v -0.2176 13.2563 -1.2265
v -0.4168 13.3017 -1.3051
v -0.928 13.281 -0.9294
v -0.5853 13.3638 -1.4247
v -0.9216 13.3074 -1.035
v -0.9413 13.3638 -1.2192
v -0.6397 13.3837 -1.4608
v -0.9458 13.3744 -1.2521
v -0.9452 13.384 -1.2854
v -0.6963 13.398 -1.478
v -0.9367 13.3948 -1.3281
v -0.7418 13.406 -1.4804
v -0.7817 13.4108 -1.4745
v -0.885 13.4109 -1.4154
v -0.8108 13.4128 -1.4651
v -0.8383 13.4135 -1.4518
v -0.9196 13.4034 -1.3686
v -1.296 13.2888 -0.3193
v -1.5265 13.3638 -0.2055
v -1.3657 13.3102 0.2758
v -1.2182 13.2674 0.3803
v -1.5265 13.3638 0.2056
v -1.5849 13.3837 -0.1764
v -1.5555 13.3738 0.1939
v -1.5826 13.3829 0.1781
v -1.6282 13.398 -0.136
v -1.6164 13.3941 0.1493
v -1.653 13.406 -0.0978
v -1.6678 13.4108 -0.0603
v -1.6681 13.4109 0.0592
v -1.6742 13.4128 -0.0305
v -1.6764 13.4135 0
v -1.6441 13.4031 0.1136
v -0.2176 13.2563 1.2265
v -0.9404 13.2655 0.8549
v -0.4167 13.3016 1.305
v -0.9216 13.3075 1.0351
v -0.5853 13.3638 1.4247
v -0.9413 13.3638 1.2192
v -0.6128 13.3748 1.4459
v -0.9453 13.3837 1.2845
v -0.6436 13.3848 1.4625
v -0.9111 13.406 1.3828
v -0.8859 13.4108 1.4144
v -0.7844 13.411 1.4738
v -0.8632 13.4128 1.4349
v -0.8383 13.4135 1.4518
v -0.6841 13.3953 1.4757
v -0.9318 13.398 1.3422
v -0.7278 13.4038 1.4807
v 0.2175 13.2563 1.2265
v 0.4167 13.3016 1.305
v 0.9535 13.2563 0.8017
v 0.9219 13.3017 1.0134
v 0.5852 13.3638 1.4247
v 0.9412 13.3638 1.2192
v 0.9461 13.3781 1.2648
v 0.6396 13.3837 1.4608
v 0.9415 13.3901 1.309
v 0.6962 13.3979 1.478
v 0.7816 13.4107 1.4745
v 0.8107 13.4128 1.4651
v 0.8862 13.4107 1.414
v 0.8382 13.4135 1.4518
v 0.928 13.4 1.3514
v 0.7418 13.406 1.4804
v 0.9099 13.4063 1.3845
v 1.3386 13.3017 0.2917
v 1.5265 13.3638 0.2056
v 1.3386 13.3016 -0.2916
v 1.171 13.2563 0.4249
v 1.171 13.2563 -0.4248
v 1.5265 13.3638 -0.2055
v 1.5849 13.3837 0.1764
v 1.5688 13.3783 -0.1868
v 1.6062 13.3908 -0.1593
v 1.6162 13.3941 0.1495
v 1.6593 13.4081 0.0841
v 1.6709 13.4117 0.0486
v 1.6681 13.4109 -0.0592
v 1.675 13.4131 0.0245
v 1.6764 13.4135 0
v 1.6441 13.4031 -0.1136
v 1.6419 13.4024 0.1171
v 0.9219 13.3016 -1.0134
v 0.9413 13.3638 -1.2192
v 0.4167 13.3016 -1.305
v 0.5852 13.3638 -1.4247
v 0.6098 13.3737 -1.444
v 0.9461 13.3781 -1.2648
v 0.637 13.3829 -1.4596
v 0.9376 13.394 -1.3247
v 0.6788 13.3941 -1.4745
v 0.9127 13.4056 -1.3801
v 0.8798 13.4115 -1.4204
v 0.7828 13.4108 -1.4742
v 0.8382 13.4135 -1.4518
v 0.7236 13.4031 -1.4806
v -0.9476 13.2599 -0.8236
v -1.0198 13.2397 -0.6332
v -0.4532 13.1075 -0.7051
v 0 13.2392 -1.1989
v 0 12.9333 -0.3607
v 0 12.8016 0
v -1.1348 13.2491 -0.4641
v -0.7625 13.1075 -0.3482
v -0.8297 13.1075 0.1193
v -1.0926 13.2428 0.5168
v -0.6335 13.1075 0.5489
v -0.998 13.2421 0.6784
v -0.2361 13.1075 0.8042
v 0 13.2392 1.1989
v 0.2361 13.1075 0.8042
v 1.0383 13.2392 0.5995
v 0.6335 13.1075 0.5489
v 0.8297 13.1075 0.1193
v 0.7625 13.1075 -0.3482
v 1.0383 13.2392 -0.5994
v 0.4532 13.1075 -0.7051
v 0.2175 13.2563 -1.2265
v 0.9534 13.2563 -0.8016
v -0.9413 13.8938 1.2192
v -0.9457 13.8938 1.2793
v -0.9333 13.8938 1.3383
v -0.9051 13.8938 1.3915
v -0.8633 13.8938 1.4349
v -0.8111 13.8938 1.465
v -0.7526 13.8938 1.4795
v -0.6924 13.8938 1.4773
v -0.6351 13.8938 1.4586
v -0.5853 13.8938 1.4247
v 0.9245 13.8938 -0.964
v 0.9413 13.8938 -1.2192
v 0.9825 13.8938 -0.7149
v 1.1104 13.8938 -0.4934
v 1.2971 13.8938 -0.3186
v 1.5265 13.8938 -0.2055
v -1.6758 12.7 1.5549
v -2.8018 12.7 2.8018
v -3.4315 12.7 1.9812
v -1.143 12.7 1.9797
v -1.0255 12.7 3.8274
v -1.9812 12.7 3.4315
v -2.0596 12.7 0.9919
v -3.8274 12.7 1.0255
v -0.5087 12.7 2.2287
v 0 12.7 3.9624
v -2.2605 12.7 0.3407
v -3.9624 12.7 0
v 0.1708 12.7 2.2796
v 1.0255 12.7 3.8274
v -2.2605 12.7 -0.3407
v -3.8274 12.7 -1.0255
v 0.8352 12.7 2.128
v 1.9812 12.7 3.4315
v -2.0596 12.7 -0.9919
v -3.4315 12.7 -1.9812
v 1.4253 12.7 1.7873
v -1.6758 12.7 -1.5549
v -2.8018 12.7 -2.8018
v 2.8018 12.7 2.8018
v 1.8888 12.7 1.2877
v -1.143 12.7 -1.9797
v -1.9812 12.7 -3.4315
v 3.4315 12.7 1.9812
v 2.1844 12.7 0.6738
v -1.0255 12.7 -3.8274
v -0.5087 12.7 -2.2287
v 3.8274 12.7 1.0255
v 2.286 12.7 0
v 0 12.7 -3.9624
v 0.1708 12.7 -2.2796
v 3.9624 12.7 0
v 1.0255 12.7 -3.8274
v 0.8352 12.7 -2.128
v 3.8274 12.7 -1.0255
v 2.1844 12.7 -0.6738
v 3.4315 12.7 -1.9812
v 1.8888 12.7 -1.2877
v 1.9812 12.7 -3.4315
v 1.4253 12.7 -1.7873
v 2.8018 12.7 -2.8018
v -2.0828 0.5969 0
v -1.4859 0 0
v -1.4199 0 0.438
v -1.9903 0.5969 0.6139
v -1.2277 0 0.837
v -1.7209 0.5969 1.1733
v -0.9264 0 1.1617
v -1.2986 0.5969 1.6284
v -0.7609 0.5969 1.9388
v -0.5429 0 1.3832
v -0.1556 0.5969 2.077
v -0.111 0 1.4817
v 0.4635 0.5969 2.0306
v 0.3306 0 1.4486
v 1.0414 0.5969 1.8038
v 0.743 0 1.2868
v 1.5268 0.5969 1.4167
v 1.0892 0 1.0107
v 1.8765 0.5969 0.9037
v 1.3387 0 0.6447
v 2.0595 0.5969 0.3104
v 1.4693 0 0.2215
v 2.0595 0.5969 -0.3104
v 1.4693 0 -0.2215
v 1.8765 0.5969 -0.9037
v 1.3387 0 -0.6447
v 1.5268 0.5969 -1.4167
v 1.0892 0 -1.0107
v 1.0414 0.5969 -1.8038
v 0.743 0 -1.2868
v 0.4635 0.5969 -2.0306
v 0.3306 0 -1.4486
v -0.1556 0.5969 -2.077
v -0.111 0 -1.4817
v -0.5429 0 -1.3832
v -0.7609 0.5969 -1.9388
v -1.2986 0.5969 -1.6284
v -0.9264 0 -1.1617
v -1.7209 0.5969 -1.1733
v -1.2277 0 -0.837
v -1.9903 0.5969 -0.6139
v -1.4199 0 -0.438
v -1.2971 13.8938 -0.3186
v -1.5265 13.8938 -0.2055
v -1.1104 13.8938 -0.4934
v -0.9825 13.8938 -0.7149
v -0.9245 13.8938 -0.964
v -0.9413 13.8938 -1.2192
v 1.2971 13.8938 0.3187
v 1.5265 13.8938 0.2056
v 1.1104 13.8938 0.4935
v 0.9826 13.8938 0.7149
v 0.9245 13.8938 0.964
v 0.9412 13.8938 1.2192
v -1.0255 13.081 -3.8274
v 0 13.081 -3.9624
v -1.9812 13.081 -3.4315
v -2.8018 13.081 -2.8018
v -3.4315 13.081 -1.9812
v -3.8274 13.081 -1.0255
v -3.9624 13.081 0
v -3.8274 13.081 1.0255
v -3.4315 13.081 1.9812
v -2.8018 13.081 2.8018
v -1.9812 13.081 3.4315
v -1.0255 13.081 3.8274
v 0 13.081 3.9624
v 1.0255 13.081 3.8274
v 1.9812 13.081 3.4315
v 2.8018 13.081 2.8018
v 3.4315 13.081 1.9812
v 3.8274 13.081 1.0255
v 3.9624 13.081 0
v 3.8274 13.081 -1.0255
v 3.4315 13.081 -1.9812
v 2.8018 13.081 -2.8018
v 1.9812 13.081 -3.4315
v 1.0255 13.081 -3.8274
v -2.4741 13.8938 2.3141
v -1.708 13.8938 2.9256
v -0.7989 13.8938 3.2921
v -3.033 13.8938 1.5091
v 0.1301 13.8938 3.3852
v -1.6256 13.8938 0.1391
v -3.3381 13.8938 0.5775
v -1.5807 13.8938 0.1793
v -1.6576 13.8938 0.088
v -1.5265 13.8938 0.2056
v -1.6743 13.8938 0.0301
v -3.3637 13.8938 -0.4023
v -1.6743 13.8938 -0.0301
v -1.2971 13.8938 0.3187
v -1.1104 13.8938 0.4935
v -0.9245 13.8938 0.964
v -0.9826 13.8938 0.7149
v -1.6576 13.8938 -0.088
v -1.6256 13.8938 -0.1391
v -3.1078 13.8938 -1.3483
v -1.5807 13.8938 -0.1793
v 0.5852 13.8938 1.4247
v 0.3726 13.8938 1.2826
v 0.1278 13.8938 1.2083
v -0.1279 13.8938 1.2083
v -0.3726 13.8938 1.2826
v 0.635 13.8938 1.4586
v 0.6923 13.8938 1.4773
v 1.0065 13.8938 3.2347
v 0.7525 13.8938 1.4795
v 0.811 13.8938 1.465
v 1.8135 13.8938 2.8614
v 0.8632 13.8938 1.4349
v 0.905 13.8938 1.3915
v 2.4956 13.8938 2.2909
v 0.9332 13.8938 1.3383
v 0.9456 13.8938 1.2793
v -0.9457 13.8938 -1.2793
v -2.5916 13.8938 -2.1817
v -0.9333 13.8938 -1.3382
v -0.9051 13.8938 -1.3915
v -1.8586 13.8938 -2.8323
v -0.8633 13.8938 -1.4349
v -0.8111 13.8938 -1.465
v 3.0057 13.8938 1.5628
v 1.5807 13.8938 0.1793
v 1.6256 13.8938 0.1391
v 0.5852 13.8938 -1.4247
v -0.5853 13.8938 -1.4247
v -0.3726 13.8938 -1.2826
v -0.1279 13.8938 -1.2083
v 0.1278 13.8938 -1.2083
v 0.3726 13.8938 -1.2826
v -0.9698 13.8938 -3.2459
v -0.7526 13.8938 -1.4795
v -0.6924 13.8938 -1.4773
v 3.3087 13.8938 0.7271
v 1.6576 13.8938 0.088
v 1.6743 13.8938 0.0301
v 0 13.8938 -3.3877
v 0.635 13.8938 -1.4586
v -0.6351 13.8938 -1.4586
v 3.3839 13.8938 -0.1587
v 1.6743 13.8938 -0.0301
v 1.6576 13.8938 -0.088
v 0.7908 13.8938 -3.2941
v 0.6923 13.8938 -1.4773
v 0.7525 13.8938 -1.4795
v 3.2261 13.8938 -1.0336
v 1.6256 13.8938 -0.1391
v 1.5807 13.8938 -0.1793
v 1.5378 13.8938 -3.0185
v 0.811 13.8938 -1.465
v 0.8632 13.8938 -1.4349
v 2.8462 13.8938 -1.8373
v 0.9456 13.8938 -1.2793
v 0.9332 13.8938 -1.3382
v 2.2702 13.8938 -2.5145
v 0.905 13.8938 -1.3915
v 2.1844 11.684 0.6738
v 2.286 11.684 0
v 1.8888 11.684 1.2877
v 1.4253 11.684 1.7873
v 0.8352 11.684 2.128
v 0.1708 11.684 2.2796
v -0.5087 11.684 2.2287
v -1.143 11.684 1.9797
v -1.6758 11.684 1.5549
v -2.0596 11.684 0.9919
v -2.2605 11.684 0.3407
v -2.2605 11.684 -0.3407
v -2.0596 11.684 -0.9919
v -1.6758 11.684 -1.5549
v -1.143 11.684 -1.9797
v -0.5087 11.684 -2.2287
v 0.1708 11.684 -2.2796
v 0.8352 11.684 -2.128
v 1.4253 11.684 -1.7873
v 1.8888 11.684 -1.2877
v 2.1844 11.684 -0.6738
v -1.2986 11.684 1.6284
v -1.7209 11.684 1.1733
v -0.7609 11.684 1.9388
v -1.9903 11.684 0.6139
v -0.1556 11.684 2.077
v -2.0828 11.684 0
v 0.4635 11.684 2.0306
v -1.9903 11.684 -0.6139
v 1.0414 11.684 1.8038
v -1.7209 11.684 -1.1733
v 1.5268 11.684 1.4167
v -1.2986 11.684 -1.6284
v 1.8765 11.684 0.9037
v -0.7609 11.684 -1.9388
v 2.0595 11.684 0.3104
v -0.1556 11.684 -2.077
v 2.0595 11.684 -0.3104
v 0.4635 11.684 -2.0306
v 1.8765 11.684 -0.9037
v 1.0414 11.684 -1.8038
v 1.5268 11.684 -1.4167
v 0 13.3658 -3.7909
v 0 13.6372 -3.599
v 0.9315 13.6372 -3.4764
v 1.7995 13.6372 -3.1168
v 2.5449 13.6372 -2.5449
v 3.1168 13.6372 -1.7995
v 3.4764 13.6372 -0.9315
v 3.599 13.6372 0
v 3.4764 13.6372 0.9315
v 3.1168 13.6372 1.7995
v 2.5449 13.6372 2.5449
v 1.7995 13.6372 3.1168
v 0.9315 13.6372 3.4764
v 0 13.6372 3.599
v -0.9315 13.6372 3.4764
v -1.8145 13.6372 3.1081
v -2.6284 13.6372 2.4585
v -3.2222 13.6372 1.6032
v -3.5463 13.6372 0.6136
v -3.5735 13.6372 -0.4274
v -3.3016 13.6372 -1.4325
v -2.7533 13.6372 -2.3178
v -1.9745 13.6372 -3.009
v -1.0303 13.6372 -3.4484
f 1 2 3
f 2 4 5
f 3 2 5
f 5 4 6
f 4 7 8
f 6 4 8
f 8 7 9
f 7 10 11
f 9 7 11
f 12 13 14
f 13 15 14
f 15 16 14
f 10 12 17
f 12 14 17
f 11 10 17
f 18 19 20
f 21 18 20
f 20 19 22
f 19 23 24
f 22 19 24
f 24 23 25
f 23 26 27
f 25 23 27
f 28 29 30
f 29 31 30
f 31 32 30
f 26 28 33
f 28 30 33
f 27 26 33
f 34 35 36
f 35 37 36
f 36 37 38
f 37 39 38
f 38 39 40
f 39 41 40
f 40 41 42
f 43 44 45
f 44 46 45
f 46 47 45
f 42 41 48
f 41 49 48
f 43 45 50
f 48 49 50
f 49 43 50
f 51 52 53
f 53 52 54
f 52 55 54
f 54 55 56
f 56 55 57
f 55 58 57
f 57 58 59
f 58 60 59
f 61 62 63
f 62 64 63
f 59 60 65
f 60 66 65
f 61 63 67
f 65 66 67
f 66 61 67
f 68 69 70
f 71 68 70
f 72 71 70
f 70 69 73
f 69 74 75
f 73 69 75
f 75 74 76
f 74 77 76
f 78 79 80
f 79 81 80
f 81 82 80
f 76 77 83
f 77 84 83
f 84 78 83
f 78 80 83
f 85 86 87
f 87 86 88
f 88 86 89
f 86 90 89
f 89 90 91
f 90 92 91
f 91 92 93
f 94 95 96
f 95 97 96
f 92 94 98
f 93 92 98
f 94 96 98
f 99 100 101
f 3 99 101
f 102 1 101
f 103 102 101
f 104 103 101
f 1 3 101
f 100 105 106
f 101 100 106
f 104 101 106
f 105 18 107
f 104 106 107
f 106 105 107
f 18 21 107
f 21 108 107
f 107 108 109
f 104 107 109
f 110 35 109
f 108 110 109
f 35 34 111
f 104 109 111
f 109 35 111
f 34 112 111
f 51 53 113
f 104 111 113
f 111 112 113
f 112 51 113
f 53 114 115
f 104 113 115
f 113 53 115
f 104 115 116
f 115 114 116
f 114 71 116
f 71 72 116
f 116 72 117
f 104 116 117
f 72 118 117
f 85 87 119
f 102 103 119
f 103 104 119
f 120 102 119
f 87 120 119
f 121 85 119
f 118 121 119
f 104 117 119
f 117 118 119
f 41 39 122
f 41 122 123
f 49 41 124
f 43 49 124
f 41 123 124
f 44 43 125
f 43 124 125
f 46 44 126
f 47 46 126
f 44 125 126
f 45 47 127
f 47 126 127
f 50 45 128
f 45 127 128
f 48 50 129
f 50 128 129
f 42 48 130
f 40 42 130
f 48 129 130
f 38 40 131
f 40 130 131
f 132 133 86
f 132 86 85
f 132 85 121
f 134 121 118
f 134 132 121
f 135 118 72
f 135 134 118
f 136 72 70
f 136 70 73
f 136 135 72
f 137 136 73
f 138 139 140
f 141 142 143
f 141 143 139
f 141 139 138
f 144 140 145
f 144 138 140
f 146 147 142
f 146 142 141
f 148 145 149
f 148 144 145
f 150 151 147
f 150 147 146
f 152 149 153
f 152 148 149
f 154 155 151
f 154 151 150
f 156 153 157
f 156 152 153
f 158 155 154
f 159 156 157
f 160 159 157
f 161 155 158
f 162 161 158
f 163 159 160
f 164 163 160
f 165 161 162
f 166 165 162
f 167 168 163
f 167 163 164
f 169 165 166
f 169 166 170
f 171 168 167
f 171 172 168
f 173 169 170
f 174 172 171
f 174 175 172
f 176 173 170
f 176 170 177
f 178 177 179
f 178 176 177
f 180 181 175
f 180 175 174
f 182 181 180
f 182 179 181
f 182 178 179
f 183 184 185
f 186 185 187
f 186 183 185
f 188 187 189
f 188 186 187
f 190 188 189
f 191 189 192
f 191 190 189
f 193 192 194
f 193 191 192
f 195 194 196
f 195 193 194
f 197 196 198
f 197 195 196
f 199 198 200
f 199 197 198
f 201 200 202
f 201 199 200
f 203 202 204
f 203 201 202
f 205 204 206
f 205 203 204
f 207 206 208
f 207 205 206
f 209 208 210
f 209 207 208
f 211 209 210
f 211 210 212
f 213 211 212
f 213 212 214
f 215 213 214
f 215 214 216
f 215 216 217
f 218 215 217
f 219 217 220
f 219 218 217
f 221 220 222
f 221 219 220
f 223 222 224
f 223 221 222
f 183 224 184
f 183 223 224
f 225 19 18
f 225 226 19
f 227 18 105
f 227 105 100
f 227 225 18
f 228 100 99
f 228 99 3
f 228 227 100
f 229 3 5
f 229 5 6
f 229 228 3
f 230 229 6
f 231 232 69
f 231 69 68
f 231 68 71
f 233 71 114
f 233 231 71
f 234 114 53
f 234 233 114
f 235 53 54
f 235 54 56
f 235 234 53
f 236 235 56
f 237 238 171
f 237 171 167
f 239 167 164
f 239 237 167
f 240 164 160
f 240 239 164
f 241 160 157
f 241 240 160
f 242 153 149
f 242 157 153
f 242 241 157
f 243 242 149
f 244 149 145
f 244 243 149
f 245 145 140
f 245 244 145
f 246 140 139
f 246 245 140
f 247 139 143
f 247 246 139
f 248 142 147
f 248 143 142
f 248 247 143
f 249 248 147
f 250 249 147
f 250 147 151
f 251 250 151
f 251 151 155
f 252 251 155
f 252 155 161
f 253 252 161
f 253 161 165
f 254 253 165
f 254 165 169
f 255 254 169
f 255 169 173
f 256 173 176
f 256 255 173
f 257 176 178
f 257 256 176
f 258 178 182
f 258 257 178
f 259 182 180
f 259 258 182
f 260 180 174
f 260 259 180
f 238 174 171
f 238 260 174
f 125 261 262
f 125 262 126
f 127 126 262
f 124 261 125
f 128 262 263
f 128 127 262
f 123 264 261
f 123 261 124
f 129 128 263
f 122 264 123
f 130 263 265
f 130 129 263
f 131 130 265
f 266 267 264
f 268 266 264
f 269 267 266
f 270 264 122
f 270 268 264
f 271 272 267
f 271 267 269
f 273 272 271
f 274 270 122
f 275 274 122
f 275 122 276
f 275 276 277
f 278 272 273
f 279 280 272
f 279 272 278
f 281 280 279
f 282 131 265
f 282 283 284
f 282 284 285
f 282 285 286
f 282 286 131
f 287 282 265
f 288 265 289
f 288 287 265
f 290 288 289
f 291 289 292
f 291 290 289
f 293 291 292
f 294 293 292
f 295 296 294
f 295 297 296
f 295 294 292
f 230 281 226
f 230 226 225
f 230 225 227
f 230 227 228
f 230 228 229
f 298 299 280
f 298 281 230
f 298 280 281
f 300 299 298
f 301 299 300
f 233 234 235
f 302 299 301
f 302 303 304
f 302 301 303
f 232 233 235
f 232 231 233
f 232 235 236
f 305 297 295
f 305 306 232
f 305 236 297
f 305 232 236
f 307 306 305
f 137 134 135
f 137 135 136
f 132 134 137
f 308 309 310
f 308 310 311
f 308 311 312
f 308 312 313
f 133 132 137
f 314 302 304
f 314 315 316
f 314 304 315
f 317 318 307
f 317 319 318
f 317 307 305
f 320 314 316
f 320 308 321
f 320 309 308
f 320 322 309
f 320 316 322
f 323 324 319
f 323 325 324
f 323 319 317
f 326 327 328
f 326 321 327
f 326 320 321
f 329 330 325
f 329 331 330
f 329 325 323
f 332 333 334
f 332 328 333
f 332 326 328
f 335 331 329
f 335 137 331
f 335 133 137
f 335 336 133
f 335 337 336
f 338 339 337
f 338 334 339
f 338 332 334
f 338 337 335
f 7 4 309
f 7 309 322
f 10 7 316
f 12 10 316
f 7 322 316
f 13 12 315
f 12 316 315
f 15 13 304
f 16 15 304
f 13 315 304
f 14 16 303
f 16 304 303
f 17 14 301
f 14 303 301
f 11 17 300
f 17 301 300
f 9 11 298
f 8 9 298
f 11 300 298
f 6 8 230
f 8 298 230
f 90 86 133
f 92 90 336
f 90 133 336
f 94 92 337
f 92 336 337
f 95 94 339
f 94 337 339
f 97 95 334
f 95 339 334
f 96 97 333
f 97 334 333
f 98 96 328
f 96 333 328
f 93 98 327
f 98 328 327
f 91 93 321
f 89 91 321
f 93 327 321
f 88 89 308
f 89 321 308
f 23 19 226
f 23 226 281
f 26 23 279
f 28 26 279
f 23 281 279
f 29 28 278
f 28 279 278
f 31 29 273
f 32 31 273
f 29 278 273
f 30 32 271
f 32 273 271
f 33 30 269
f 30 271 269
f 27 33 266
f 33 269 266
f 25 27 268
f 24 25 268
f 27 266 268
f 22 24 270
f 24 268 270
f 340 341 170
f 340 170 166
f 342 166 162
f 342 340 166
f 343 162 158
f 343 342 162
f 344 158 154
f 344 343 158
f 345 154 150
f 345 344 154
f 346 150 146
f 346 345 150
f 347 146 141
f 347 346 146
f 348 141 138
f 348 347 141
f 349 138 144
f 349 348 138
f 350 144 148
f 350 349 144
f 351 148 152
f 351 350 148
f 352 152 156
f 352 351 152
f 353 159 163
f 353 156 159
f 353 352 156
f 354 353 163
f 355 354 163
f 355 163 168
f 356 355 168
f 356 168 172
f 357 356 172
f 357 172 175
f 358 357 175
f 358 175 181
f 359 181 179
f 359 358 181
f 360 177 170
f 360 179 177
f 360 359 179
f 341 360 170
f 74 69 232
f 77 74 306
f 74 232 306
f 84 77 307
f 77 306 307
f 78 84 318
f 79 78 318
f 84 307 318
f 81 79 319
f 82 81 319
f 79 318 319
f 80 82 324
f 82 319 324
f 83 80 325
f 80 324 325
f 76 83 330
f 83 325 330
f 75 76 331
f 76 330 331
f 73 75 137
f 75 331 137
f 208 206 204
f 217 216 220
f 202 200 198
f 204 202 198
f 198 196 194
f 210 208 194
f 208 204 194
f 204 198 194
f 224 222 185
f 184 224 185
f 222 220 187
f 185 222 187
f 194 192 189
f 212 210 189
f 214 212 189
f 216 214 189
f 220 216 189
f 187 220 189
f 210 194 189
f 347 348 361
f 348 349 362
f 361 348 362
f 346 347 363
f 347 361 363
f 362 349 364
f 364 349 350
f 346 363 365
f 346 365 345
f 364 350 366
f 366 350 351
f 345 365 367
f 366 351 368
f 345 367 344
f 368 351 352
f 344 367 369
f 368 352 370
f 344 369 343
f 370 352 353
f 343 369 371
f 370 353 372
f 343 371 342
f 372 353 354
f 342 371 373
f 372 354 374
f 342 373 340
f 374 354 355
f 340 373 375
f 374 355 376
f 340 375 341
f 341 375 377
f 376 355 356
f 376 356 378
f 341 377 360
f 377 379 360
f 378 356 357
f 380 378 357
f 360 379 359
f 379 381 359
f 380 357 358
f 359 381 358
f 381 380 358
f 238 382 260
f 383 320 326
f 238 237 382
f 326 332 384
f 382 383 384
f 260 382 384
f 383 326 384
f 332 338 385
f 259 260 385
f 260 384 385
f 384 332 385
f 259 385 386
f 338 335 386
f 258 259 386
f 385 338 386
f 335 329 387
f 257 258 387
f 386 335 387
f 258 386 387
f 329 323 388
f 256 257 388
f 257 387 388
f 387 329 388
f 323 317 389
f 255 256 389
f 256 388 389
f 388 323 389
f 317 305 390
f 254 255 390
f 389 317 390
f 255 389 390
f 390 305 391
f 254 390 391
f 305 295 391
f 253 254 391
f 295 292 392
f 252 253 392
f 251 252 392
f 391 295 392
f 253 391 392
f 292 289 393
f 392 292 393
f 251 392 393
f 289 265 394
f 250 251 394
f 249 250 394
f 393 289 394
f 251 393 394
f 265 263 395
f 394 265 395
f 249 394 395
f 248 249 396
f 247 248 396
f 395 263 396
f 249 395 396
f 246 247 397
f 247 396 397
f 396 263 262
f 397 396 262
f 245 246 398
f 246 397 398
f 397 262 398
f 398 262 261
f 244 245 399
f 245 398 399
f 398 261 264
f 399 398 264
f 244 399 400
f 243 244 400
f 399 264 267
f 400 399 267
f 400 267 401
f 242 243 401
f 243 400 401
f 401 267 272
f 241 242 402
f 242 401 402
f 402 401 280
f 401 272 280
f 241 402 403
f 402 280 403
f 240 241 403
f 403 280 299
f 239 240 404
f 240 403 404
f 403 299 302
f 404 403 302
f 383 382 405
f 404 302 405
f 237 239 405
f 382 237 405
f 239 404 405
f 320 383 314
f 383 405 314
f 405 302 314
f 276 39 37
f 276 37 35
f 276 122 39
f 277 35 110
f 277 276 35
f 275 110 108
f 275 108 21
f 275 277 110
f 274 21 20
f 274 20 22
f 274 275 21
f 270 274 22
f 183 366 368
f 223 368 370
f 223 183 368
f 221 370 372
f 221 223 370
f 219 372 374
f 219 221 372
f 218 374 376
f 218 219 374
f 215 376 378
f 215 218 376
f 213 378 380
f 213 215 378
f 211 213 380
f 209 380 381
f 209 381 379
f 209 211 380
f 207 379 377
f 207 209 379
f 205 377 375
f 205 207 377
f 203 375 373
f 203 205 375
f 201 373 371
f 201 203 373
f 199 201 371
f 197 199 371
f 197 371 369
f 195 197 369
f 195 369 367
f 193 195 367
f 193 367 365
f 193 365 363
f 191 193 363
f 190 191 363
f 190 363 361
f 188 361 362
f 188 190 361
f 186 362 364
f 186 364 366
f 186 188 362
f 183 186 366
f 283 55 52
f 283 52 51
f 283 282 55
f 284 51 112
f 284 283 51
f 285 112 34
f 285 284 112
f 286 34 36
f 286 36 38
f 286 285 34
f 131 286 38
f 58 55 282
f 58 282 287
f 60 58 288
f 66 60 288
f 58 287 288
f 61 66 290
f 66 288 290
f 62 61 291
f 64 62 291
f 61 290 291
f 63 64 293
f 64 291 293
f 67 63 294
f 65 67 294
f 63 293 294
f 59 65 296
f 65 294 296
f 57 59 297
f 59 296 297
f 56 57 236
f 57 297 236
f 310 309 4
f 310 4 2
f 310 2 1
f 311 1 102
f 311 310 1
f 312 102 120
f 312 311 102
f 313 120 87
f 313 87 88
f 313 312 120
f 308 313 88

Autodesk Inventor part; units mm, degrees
ref_plane "YZ Plane" through (0, 0, 0) normal (1, 0, 0) x (0, 1, 0)
ref_plane "XZ Plane" through (0, 0, 0) normal (0, 1, 0) x (-1, 0, 0)
ref_plane "XY Plane" through (0, 0, 0) normal (0, 0, 1) x (1, 0, 0)
sketch "Sketch1" plane through (0, 0, 0) normal (0, 1, 0) x (-1, 0, 0)
  circle A0 centre (0, 0) radius 2.0828
  dimension "d4" = 4.1656
extrude "Body" add sketch "Sketch1" along normal blind 12.7
sketch "Sketch2" plane through (0, 0, 0) normal (1, 0, 0) x (0, 1, 0)
  line L0 (12.7, -2.0828) -> (12.7, 2.0828) projected
  line L1 (12.7, 0) -> (12.7, -3.9624)
  line L2 (12.7, -3.9624) -> (13.081, -3.9624)
  arc A0 (13.081, -3.9624) -> (14.9098, -2.0828) centre (10.8888, 0) ccw
  line L3 (14.9098, -2.0828) -> (14.9098, -1.6764)
  line L4 (14.9098, -1.6764) -> (13.4135, -1.6764)
  line L5 (13.4135, -1.6764) -> (12.8016, 0)
  line L6 (12.8016, 0) -> (12.7, 0)
  point P0 (0, 0)
  dimension "d5" = 3.9624
  dimension "d6" = 0.381
  dimension "d13" = 0.1016
  dimension "d14" = 2.0828
  dimension "d15" = 2.2098
  dimension "d16" = 0
  dimension "d17" = 1.6764
  dimension "d57" = 20.053
revolve "Head" add sketch "Sketch2" angle 360 about axis through (0, 12.8016, 0) along (0, -1, 0)
sketch "Sketch3" plane through (0, 14.9098, 0) normal (0, 1, 0) x (1, 0, 0)
  circle A0 centre (0, 0) radius 1.6764 projected
  line L0 (0.7302, -1.2648) -> (-0.7303, -1.2648) construction
  line L1 (-0.7303, -1.2648) -> (-1.4605, 0) construction
  line L2 (-1.4605, 0) -> (-0.7303, 1.2648) construction
  line L3 (-0.7303, 1.2648) -> (0.7302, 1.2648) construction
  line L4 (0.7302, 1.2648) -> (1.4605, 0) construction
  line L5 (1.4605, 0) -> (0.7302, -1.2648) construction
  circle A1 centre (-0.7303, -1.2648) radius 0.2159
  circle A2 centre (-1.4605, 0) radius 0.2159
  circle A3 centre (-0.7303, 1.2648) radius 0.2159
  circle A4 centre (0.7302, 1.2648) radius 0.2159
  circle A5 centre (1.4605, 0) radius 0.2159
  circle A6 centre (0.7302, -1.2648) radius 0.2159
  circle A7 centre (0, -2.0701) radius 0.8712
  circle A8 centre (0, 2.0701) radius 0.8712
  circle A9 centre (1.7928, -1.0351) radius 0.8712
  circle A10 centre (-1.7928, 1.035) radius 0.8712
  circle A11 centre (1.7928, 1.035) radius 0.8712
  circle A12 centre (-1.7928, -1.0351) radius 0.8712
  circle A13 centre (0, 0) radius 1.8188
  point P0 (0, 0)
  point P1 (0, 0)
  point P2 (0.9413, 1.2192)
  point P3 (1.5265, 0.2056)
  point P4 (1.5265, -0.2056)
  point P5 (0.9413, -1.2192)
  point P6 (0.5852, -1.4248)
  point P7 (-0.5852, -1.4248)
  point P8 (-0.9413, -1.2192)
  point P9 (-1.5265, -0.2056)
  point P10 (-1.5265, 0.2056)
  point P11 (-0.9413, 1.2192)
  point P12 (-0.5852, 1.4248)
  point P13 (0.5852, 1.4248)
  dimension "d58" = 2.921
  dimension "d59" = 4.1402
  dimension "d62" = 120
extrude "Hex" add sketch "Sketch3" against normal blind 1.778 contours A5 A11 A0 | A0 A11 A13 A9 | A0 A9 A5 | A11 A0 | A0 A11 A13 | A9 A13 A0 | A0 A9 | A11 A4 A0 | A0 A8 A13 A11 | A9 A13 A7 A0 | A0 A6 A9 | A4 A8 A0 | A0 A7 A6 | A8 A0 | A7 A0 | A0 A8 A13 | A7 A13 A0 | A3 A0 A8 | A7 A0 A1 | A0 A10 A13 A8 | A7 A13 A12 A0 | A3 A10 A0 | A0 A12 A1 | A10 A0 A13 | A13 A12 A0 | A10 A0 | A0 A12 | A10 A0 A12 A13 | A10 A2 A0 | A0 A2 A12
sketch "Sketch4" plane through (0, 0, 0) normal (0, 0, 1) x (1, 0, 0)
  line L0 (-0.7364, 13.9698) -> (-1.6764, 14.9098)
  line L1 (0, 14.9098) -> (-0.7364, 13.9698)
  line L2 (0, -1.9152) -> (0, 11.491) projected
  line L3 (-1.5265, 14.9098) -> (-1.5265, 13.3638) projected
  line L4 (-1.5265, 14.9098) -> (-1.5265, 14.9098) projected
  line L5 (-1.5265, 14.9098) -> (-1.5265, 13.3638) projected
  line L6 (-1.6764, 14.9098) -> (-1.5265, 14.9098) projected
  line L7 (-1.6764, 14.9098) -> (0, 14.9098)
  point P0 (0, 0)
  point P1 (-1.6764, 13.4135)
  dimension "d29" = 1.6764
revolve "Head Chamfer" cut sketch "Sketch4" angle 360 about axis through (0, -10, 0) along (0, 1, 0)
feature "Thread" [suppressed]
sketch "Sketch6" plane through (0, 0, 0) normal (0, 0, 1) x (1, 0, 0)
  line L0 (0, 0) -> (-1.4859, 0)
  line L1 (2.0828, 0) -> (-2.0828, 0) projected
  line L2 (-1.4859, 0) -> (-2.4948, 1.0089)
  line L3 (-2.4948, 1.0089) -> (-2.9651, -1.2188)
  line L4 (-2.9651, -1.2188) -> (-1.4859, -1.2188)
  line L5 (-2.0828, 0) -> (-2.0828, 12.7) projected
  line L6 (-1.4859, -1.2188) -> (-1.4859, 0)
  line L7 (0, -2.9358) -> (0, 9.083) projected
  point P0 (-2.0828, 0.5969)
  dimension "d49" = 1.4859
  dimension "d50" = 135
revolve "Tapered End" cut sketch "Sketch6" angle 360 about axis through (0, -10, 0) along (0, 1, 0)
sketch "Sketch8" plane through (0, 0, 0) normal (0, 0, 1) x (1, 0, 0)
  line L0 (-3.9624, 12.7) -> (3.9624, 12.7) projected
  line L1 (0, 12.7) -> (2.286, 12.7)
  line L2 (2.286, 12.7) -> (2.286, 11.684)
  line L3 (2.286, 11.684) -> (0, 11.684)
  line L4 (0, 11.684) -> (0, 12.7)
  point P0 (0, 0)
  dimension "d69" = 2.286
  dimension "d70" = 1.016
revolve "Shoulder" add sketch "Sketch8" angle 360 about axis through (0, 11.684, 0) along (0, 1, 0)
sketch "Sketch9" plane through (0, 14.9098, 0) normal (0, 1, 0) x (1, 0, 0)
  circle A0 centre (0, 0) radius 5.7238
  point P0 (0, 0)
extrude "Extrusion3" cut sketch "Sketch9" against normal blind 1.016
sketch "Sketch5" plane through (0, 0, 0) normal (1, 0, 0) x (0, 1, 0)
  line L0 (0, -2.0828) -> (12.7, -2.0828) projected
  line L1 (12.7, 3.9624) -> (12.7, -3.9624) projected
  line L2 (12.7, -2.0828) -> (12.7, 2.0828) projected
  line L3 (0.0745, -2.0828) -> (-0.2261, -2.6035)
  line L4 (-0.2261, -2.6035) -> (-0.3253, -2.6035)
  line L5 (-0.3253, -2.6035) -> (-0.626, -2.0828)
  line L6 (0.0686, -2.6035) -> (-0.7252, -2.6035) construction
  line L7 (-0.626, -2.0828) -> (0.0745, -2.0828)
  line L8 (0, -2.0828) -> (12.7, -2.0828) projected
  point P0 (0, 0)
  dimension "d31" = 30
  dimension "d32" = 60
  dimension "a" = 0.0992
  dimension "d46" = 0.7937
  dimension "d54" = 0.0686
  dimension "d55" = 0.5207
  dimension "d56" = 0.0992
equation "\"d56\" = a"
equation "\"ShoulderLength\" = 1.016"
properties part number "Shoulder Screw 8-32 Shoulder 0.090 Length 0.290" material "VEX Steel"
